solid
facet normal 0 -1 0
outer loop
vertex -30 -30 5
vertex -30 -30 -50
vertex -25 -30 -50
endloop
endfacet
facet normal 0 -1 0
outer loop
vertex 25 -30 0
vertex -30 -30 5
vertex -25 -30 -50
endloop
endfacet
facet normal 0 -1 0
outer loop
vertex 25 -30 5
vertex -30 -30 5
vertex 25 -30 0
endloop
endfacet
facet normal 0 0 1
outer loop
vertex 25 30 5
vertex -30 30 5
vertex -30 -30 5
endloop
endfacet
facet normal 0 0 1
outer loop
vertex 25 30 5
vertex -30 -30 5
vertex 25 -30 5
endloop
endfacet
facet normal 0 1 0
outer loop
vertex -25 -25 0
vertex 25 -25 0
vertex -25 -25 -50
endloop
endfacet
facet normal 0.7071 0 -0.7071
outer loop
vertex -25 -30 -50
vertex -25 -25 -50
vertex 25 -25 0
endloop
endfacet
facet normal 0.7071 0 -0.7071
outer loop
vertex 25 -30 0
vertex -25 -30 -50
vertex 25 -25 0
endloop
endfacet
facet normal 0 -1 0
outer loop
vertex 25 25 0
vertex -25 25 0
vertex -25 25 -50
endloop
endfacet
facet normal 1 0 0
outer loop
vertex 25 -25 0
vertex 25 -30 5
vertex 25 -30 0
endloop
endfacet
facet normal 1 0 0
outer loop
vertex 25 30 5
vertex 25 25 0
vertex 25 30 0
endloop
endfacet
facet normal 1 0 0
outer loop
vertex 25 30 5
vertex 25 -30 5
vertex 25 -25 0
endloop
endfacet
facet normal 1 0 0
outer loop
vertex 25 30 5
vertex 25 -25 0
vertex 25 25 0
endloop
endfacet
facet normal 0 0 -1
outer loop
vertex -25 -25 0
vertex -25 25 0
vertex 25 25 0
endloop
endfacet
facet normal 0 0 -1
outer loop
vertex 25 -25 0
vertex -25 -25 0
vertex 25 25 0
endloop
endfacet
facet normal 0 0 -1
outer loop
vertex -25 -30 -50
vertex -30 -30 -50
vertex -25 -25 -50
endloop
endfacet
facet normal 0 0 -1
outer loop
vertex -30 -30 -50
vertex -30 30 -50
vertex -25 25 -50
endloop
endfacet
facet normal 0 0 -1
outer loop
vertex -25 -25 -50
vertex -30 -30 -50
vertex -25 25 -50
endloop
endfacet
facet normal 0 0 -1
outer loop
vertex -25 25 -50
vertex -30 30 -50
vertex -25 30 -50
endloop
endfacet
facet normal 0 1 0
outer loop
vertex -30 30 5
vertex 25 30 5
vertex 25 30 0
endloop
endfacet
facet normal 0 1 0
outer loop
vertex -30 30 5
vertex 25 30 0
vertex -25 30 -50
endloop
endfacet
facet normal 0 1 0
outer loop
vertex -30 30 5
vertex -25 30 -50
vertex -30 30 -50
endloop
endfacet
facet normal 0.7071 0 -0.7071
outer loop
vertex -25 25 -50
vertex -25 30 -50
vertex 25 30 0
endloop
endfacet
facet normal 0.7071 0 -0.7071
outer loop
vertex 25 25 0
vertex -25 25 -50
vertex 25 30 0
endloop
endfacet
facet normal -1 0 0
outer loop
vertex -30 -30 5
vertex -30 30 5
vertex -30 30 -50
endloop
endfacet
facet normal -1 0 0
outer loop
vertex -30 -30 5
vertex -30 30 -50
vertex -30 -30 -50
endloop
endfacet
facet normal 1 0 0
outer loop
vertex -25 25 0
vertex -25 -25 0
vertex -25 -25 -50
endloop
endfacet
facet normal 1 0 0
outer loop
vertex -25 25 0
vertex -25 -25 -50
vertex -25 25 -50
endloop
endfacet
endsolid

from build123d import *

# Parameters (mm, degrees)
F2_W     = 5
F2_H     = 50
F2_W_2   = 50
F3_DEPTH = 5
F4_DEPTH = 50
F6_DEPTH = 60.001


with BuildPart() as f3:
    # F2 (on Top) → F3 (new body)
    with BuildSketch(Plane.XY):
        Polygon((-30, 25), (-25, 25), (25, 25), (25, 30), (-30, 30), align=None)
        with Locations((-27.5, 0)):
            Rectangle(F2_W, F2_H)
        Rectangle(F2_W_2, F2_H)
        Polygon((25, -25), (-25, -25), (-30, -25), (-30, -30), (25, -30), align=None)
    extrude(amount=F3_DEPTH)

    # F2 (on Top) → F4 (join)
    with BuildSketch(Plane.XY):
        Polygon((25, -25), (-25, -25), (-30, -25), (-30, -30), (25, -30), align=None)
        Polygon((-30, 25), (-25, 25), (25, 25), (25, 30), (-30, 30), align=None)
        with Locations((-27.5, 0)):
            Rectangle(F2_W, F2_H)
    extrude(amount=-F4_DEPTH)

    # F5 (on face) → F6 (cut, through all)
    with BuildSketch(Plane(origin=(0, 30, 0), x_dir=(-1, 0, 0), z_dir=(0, 1, 0))):
        Polygon((25, -50), (-25, 0), (-25, -50), align=None)
    extrude(amount=-F6_DEPTH, mode=Mode.SUBTRACT)


solid = f3.part
